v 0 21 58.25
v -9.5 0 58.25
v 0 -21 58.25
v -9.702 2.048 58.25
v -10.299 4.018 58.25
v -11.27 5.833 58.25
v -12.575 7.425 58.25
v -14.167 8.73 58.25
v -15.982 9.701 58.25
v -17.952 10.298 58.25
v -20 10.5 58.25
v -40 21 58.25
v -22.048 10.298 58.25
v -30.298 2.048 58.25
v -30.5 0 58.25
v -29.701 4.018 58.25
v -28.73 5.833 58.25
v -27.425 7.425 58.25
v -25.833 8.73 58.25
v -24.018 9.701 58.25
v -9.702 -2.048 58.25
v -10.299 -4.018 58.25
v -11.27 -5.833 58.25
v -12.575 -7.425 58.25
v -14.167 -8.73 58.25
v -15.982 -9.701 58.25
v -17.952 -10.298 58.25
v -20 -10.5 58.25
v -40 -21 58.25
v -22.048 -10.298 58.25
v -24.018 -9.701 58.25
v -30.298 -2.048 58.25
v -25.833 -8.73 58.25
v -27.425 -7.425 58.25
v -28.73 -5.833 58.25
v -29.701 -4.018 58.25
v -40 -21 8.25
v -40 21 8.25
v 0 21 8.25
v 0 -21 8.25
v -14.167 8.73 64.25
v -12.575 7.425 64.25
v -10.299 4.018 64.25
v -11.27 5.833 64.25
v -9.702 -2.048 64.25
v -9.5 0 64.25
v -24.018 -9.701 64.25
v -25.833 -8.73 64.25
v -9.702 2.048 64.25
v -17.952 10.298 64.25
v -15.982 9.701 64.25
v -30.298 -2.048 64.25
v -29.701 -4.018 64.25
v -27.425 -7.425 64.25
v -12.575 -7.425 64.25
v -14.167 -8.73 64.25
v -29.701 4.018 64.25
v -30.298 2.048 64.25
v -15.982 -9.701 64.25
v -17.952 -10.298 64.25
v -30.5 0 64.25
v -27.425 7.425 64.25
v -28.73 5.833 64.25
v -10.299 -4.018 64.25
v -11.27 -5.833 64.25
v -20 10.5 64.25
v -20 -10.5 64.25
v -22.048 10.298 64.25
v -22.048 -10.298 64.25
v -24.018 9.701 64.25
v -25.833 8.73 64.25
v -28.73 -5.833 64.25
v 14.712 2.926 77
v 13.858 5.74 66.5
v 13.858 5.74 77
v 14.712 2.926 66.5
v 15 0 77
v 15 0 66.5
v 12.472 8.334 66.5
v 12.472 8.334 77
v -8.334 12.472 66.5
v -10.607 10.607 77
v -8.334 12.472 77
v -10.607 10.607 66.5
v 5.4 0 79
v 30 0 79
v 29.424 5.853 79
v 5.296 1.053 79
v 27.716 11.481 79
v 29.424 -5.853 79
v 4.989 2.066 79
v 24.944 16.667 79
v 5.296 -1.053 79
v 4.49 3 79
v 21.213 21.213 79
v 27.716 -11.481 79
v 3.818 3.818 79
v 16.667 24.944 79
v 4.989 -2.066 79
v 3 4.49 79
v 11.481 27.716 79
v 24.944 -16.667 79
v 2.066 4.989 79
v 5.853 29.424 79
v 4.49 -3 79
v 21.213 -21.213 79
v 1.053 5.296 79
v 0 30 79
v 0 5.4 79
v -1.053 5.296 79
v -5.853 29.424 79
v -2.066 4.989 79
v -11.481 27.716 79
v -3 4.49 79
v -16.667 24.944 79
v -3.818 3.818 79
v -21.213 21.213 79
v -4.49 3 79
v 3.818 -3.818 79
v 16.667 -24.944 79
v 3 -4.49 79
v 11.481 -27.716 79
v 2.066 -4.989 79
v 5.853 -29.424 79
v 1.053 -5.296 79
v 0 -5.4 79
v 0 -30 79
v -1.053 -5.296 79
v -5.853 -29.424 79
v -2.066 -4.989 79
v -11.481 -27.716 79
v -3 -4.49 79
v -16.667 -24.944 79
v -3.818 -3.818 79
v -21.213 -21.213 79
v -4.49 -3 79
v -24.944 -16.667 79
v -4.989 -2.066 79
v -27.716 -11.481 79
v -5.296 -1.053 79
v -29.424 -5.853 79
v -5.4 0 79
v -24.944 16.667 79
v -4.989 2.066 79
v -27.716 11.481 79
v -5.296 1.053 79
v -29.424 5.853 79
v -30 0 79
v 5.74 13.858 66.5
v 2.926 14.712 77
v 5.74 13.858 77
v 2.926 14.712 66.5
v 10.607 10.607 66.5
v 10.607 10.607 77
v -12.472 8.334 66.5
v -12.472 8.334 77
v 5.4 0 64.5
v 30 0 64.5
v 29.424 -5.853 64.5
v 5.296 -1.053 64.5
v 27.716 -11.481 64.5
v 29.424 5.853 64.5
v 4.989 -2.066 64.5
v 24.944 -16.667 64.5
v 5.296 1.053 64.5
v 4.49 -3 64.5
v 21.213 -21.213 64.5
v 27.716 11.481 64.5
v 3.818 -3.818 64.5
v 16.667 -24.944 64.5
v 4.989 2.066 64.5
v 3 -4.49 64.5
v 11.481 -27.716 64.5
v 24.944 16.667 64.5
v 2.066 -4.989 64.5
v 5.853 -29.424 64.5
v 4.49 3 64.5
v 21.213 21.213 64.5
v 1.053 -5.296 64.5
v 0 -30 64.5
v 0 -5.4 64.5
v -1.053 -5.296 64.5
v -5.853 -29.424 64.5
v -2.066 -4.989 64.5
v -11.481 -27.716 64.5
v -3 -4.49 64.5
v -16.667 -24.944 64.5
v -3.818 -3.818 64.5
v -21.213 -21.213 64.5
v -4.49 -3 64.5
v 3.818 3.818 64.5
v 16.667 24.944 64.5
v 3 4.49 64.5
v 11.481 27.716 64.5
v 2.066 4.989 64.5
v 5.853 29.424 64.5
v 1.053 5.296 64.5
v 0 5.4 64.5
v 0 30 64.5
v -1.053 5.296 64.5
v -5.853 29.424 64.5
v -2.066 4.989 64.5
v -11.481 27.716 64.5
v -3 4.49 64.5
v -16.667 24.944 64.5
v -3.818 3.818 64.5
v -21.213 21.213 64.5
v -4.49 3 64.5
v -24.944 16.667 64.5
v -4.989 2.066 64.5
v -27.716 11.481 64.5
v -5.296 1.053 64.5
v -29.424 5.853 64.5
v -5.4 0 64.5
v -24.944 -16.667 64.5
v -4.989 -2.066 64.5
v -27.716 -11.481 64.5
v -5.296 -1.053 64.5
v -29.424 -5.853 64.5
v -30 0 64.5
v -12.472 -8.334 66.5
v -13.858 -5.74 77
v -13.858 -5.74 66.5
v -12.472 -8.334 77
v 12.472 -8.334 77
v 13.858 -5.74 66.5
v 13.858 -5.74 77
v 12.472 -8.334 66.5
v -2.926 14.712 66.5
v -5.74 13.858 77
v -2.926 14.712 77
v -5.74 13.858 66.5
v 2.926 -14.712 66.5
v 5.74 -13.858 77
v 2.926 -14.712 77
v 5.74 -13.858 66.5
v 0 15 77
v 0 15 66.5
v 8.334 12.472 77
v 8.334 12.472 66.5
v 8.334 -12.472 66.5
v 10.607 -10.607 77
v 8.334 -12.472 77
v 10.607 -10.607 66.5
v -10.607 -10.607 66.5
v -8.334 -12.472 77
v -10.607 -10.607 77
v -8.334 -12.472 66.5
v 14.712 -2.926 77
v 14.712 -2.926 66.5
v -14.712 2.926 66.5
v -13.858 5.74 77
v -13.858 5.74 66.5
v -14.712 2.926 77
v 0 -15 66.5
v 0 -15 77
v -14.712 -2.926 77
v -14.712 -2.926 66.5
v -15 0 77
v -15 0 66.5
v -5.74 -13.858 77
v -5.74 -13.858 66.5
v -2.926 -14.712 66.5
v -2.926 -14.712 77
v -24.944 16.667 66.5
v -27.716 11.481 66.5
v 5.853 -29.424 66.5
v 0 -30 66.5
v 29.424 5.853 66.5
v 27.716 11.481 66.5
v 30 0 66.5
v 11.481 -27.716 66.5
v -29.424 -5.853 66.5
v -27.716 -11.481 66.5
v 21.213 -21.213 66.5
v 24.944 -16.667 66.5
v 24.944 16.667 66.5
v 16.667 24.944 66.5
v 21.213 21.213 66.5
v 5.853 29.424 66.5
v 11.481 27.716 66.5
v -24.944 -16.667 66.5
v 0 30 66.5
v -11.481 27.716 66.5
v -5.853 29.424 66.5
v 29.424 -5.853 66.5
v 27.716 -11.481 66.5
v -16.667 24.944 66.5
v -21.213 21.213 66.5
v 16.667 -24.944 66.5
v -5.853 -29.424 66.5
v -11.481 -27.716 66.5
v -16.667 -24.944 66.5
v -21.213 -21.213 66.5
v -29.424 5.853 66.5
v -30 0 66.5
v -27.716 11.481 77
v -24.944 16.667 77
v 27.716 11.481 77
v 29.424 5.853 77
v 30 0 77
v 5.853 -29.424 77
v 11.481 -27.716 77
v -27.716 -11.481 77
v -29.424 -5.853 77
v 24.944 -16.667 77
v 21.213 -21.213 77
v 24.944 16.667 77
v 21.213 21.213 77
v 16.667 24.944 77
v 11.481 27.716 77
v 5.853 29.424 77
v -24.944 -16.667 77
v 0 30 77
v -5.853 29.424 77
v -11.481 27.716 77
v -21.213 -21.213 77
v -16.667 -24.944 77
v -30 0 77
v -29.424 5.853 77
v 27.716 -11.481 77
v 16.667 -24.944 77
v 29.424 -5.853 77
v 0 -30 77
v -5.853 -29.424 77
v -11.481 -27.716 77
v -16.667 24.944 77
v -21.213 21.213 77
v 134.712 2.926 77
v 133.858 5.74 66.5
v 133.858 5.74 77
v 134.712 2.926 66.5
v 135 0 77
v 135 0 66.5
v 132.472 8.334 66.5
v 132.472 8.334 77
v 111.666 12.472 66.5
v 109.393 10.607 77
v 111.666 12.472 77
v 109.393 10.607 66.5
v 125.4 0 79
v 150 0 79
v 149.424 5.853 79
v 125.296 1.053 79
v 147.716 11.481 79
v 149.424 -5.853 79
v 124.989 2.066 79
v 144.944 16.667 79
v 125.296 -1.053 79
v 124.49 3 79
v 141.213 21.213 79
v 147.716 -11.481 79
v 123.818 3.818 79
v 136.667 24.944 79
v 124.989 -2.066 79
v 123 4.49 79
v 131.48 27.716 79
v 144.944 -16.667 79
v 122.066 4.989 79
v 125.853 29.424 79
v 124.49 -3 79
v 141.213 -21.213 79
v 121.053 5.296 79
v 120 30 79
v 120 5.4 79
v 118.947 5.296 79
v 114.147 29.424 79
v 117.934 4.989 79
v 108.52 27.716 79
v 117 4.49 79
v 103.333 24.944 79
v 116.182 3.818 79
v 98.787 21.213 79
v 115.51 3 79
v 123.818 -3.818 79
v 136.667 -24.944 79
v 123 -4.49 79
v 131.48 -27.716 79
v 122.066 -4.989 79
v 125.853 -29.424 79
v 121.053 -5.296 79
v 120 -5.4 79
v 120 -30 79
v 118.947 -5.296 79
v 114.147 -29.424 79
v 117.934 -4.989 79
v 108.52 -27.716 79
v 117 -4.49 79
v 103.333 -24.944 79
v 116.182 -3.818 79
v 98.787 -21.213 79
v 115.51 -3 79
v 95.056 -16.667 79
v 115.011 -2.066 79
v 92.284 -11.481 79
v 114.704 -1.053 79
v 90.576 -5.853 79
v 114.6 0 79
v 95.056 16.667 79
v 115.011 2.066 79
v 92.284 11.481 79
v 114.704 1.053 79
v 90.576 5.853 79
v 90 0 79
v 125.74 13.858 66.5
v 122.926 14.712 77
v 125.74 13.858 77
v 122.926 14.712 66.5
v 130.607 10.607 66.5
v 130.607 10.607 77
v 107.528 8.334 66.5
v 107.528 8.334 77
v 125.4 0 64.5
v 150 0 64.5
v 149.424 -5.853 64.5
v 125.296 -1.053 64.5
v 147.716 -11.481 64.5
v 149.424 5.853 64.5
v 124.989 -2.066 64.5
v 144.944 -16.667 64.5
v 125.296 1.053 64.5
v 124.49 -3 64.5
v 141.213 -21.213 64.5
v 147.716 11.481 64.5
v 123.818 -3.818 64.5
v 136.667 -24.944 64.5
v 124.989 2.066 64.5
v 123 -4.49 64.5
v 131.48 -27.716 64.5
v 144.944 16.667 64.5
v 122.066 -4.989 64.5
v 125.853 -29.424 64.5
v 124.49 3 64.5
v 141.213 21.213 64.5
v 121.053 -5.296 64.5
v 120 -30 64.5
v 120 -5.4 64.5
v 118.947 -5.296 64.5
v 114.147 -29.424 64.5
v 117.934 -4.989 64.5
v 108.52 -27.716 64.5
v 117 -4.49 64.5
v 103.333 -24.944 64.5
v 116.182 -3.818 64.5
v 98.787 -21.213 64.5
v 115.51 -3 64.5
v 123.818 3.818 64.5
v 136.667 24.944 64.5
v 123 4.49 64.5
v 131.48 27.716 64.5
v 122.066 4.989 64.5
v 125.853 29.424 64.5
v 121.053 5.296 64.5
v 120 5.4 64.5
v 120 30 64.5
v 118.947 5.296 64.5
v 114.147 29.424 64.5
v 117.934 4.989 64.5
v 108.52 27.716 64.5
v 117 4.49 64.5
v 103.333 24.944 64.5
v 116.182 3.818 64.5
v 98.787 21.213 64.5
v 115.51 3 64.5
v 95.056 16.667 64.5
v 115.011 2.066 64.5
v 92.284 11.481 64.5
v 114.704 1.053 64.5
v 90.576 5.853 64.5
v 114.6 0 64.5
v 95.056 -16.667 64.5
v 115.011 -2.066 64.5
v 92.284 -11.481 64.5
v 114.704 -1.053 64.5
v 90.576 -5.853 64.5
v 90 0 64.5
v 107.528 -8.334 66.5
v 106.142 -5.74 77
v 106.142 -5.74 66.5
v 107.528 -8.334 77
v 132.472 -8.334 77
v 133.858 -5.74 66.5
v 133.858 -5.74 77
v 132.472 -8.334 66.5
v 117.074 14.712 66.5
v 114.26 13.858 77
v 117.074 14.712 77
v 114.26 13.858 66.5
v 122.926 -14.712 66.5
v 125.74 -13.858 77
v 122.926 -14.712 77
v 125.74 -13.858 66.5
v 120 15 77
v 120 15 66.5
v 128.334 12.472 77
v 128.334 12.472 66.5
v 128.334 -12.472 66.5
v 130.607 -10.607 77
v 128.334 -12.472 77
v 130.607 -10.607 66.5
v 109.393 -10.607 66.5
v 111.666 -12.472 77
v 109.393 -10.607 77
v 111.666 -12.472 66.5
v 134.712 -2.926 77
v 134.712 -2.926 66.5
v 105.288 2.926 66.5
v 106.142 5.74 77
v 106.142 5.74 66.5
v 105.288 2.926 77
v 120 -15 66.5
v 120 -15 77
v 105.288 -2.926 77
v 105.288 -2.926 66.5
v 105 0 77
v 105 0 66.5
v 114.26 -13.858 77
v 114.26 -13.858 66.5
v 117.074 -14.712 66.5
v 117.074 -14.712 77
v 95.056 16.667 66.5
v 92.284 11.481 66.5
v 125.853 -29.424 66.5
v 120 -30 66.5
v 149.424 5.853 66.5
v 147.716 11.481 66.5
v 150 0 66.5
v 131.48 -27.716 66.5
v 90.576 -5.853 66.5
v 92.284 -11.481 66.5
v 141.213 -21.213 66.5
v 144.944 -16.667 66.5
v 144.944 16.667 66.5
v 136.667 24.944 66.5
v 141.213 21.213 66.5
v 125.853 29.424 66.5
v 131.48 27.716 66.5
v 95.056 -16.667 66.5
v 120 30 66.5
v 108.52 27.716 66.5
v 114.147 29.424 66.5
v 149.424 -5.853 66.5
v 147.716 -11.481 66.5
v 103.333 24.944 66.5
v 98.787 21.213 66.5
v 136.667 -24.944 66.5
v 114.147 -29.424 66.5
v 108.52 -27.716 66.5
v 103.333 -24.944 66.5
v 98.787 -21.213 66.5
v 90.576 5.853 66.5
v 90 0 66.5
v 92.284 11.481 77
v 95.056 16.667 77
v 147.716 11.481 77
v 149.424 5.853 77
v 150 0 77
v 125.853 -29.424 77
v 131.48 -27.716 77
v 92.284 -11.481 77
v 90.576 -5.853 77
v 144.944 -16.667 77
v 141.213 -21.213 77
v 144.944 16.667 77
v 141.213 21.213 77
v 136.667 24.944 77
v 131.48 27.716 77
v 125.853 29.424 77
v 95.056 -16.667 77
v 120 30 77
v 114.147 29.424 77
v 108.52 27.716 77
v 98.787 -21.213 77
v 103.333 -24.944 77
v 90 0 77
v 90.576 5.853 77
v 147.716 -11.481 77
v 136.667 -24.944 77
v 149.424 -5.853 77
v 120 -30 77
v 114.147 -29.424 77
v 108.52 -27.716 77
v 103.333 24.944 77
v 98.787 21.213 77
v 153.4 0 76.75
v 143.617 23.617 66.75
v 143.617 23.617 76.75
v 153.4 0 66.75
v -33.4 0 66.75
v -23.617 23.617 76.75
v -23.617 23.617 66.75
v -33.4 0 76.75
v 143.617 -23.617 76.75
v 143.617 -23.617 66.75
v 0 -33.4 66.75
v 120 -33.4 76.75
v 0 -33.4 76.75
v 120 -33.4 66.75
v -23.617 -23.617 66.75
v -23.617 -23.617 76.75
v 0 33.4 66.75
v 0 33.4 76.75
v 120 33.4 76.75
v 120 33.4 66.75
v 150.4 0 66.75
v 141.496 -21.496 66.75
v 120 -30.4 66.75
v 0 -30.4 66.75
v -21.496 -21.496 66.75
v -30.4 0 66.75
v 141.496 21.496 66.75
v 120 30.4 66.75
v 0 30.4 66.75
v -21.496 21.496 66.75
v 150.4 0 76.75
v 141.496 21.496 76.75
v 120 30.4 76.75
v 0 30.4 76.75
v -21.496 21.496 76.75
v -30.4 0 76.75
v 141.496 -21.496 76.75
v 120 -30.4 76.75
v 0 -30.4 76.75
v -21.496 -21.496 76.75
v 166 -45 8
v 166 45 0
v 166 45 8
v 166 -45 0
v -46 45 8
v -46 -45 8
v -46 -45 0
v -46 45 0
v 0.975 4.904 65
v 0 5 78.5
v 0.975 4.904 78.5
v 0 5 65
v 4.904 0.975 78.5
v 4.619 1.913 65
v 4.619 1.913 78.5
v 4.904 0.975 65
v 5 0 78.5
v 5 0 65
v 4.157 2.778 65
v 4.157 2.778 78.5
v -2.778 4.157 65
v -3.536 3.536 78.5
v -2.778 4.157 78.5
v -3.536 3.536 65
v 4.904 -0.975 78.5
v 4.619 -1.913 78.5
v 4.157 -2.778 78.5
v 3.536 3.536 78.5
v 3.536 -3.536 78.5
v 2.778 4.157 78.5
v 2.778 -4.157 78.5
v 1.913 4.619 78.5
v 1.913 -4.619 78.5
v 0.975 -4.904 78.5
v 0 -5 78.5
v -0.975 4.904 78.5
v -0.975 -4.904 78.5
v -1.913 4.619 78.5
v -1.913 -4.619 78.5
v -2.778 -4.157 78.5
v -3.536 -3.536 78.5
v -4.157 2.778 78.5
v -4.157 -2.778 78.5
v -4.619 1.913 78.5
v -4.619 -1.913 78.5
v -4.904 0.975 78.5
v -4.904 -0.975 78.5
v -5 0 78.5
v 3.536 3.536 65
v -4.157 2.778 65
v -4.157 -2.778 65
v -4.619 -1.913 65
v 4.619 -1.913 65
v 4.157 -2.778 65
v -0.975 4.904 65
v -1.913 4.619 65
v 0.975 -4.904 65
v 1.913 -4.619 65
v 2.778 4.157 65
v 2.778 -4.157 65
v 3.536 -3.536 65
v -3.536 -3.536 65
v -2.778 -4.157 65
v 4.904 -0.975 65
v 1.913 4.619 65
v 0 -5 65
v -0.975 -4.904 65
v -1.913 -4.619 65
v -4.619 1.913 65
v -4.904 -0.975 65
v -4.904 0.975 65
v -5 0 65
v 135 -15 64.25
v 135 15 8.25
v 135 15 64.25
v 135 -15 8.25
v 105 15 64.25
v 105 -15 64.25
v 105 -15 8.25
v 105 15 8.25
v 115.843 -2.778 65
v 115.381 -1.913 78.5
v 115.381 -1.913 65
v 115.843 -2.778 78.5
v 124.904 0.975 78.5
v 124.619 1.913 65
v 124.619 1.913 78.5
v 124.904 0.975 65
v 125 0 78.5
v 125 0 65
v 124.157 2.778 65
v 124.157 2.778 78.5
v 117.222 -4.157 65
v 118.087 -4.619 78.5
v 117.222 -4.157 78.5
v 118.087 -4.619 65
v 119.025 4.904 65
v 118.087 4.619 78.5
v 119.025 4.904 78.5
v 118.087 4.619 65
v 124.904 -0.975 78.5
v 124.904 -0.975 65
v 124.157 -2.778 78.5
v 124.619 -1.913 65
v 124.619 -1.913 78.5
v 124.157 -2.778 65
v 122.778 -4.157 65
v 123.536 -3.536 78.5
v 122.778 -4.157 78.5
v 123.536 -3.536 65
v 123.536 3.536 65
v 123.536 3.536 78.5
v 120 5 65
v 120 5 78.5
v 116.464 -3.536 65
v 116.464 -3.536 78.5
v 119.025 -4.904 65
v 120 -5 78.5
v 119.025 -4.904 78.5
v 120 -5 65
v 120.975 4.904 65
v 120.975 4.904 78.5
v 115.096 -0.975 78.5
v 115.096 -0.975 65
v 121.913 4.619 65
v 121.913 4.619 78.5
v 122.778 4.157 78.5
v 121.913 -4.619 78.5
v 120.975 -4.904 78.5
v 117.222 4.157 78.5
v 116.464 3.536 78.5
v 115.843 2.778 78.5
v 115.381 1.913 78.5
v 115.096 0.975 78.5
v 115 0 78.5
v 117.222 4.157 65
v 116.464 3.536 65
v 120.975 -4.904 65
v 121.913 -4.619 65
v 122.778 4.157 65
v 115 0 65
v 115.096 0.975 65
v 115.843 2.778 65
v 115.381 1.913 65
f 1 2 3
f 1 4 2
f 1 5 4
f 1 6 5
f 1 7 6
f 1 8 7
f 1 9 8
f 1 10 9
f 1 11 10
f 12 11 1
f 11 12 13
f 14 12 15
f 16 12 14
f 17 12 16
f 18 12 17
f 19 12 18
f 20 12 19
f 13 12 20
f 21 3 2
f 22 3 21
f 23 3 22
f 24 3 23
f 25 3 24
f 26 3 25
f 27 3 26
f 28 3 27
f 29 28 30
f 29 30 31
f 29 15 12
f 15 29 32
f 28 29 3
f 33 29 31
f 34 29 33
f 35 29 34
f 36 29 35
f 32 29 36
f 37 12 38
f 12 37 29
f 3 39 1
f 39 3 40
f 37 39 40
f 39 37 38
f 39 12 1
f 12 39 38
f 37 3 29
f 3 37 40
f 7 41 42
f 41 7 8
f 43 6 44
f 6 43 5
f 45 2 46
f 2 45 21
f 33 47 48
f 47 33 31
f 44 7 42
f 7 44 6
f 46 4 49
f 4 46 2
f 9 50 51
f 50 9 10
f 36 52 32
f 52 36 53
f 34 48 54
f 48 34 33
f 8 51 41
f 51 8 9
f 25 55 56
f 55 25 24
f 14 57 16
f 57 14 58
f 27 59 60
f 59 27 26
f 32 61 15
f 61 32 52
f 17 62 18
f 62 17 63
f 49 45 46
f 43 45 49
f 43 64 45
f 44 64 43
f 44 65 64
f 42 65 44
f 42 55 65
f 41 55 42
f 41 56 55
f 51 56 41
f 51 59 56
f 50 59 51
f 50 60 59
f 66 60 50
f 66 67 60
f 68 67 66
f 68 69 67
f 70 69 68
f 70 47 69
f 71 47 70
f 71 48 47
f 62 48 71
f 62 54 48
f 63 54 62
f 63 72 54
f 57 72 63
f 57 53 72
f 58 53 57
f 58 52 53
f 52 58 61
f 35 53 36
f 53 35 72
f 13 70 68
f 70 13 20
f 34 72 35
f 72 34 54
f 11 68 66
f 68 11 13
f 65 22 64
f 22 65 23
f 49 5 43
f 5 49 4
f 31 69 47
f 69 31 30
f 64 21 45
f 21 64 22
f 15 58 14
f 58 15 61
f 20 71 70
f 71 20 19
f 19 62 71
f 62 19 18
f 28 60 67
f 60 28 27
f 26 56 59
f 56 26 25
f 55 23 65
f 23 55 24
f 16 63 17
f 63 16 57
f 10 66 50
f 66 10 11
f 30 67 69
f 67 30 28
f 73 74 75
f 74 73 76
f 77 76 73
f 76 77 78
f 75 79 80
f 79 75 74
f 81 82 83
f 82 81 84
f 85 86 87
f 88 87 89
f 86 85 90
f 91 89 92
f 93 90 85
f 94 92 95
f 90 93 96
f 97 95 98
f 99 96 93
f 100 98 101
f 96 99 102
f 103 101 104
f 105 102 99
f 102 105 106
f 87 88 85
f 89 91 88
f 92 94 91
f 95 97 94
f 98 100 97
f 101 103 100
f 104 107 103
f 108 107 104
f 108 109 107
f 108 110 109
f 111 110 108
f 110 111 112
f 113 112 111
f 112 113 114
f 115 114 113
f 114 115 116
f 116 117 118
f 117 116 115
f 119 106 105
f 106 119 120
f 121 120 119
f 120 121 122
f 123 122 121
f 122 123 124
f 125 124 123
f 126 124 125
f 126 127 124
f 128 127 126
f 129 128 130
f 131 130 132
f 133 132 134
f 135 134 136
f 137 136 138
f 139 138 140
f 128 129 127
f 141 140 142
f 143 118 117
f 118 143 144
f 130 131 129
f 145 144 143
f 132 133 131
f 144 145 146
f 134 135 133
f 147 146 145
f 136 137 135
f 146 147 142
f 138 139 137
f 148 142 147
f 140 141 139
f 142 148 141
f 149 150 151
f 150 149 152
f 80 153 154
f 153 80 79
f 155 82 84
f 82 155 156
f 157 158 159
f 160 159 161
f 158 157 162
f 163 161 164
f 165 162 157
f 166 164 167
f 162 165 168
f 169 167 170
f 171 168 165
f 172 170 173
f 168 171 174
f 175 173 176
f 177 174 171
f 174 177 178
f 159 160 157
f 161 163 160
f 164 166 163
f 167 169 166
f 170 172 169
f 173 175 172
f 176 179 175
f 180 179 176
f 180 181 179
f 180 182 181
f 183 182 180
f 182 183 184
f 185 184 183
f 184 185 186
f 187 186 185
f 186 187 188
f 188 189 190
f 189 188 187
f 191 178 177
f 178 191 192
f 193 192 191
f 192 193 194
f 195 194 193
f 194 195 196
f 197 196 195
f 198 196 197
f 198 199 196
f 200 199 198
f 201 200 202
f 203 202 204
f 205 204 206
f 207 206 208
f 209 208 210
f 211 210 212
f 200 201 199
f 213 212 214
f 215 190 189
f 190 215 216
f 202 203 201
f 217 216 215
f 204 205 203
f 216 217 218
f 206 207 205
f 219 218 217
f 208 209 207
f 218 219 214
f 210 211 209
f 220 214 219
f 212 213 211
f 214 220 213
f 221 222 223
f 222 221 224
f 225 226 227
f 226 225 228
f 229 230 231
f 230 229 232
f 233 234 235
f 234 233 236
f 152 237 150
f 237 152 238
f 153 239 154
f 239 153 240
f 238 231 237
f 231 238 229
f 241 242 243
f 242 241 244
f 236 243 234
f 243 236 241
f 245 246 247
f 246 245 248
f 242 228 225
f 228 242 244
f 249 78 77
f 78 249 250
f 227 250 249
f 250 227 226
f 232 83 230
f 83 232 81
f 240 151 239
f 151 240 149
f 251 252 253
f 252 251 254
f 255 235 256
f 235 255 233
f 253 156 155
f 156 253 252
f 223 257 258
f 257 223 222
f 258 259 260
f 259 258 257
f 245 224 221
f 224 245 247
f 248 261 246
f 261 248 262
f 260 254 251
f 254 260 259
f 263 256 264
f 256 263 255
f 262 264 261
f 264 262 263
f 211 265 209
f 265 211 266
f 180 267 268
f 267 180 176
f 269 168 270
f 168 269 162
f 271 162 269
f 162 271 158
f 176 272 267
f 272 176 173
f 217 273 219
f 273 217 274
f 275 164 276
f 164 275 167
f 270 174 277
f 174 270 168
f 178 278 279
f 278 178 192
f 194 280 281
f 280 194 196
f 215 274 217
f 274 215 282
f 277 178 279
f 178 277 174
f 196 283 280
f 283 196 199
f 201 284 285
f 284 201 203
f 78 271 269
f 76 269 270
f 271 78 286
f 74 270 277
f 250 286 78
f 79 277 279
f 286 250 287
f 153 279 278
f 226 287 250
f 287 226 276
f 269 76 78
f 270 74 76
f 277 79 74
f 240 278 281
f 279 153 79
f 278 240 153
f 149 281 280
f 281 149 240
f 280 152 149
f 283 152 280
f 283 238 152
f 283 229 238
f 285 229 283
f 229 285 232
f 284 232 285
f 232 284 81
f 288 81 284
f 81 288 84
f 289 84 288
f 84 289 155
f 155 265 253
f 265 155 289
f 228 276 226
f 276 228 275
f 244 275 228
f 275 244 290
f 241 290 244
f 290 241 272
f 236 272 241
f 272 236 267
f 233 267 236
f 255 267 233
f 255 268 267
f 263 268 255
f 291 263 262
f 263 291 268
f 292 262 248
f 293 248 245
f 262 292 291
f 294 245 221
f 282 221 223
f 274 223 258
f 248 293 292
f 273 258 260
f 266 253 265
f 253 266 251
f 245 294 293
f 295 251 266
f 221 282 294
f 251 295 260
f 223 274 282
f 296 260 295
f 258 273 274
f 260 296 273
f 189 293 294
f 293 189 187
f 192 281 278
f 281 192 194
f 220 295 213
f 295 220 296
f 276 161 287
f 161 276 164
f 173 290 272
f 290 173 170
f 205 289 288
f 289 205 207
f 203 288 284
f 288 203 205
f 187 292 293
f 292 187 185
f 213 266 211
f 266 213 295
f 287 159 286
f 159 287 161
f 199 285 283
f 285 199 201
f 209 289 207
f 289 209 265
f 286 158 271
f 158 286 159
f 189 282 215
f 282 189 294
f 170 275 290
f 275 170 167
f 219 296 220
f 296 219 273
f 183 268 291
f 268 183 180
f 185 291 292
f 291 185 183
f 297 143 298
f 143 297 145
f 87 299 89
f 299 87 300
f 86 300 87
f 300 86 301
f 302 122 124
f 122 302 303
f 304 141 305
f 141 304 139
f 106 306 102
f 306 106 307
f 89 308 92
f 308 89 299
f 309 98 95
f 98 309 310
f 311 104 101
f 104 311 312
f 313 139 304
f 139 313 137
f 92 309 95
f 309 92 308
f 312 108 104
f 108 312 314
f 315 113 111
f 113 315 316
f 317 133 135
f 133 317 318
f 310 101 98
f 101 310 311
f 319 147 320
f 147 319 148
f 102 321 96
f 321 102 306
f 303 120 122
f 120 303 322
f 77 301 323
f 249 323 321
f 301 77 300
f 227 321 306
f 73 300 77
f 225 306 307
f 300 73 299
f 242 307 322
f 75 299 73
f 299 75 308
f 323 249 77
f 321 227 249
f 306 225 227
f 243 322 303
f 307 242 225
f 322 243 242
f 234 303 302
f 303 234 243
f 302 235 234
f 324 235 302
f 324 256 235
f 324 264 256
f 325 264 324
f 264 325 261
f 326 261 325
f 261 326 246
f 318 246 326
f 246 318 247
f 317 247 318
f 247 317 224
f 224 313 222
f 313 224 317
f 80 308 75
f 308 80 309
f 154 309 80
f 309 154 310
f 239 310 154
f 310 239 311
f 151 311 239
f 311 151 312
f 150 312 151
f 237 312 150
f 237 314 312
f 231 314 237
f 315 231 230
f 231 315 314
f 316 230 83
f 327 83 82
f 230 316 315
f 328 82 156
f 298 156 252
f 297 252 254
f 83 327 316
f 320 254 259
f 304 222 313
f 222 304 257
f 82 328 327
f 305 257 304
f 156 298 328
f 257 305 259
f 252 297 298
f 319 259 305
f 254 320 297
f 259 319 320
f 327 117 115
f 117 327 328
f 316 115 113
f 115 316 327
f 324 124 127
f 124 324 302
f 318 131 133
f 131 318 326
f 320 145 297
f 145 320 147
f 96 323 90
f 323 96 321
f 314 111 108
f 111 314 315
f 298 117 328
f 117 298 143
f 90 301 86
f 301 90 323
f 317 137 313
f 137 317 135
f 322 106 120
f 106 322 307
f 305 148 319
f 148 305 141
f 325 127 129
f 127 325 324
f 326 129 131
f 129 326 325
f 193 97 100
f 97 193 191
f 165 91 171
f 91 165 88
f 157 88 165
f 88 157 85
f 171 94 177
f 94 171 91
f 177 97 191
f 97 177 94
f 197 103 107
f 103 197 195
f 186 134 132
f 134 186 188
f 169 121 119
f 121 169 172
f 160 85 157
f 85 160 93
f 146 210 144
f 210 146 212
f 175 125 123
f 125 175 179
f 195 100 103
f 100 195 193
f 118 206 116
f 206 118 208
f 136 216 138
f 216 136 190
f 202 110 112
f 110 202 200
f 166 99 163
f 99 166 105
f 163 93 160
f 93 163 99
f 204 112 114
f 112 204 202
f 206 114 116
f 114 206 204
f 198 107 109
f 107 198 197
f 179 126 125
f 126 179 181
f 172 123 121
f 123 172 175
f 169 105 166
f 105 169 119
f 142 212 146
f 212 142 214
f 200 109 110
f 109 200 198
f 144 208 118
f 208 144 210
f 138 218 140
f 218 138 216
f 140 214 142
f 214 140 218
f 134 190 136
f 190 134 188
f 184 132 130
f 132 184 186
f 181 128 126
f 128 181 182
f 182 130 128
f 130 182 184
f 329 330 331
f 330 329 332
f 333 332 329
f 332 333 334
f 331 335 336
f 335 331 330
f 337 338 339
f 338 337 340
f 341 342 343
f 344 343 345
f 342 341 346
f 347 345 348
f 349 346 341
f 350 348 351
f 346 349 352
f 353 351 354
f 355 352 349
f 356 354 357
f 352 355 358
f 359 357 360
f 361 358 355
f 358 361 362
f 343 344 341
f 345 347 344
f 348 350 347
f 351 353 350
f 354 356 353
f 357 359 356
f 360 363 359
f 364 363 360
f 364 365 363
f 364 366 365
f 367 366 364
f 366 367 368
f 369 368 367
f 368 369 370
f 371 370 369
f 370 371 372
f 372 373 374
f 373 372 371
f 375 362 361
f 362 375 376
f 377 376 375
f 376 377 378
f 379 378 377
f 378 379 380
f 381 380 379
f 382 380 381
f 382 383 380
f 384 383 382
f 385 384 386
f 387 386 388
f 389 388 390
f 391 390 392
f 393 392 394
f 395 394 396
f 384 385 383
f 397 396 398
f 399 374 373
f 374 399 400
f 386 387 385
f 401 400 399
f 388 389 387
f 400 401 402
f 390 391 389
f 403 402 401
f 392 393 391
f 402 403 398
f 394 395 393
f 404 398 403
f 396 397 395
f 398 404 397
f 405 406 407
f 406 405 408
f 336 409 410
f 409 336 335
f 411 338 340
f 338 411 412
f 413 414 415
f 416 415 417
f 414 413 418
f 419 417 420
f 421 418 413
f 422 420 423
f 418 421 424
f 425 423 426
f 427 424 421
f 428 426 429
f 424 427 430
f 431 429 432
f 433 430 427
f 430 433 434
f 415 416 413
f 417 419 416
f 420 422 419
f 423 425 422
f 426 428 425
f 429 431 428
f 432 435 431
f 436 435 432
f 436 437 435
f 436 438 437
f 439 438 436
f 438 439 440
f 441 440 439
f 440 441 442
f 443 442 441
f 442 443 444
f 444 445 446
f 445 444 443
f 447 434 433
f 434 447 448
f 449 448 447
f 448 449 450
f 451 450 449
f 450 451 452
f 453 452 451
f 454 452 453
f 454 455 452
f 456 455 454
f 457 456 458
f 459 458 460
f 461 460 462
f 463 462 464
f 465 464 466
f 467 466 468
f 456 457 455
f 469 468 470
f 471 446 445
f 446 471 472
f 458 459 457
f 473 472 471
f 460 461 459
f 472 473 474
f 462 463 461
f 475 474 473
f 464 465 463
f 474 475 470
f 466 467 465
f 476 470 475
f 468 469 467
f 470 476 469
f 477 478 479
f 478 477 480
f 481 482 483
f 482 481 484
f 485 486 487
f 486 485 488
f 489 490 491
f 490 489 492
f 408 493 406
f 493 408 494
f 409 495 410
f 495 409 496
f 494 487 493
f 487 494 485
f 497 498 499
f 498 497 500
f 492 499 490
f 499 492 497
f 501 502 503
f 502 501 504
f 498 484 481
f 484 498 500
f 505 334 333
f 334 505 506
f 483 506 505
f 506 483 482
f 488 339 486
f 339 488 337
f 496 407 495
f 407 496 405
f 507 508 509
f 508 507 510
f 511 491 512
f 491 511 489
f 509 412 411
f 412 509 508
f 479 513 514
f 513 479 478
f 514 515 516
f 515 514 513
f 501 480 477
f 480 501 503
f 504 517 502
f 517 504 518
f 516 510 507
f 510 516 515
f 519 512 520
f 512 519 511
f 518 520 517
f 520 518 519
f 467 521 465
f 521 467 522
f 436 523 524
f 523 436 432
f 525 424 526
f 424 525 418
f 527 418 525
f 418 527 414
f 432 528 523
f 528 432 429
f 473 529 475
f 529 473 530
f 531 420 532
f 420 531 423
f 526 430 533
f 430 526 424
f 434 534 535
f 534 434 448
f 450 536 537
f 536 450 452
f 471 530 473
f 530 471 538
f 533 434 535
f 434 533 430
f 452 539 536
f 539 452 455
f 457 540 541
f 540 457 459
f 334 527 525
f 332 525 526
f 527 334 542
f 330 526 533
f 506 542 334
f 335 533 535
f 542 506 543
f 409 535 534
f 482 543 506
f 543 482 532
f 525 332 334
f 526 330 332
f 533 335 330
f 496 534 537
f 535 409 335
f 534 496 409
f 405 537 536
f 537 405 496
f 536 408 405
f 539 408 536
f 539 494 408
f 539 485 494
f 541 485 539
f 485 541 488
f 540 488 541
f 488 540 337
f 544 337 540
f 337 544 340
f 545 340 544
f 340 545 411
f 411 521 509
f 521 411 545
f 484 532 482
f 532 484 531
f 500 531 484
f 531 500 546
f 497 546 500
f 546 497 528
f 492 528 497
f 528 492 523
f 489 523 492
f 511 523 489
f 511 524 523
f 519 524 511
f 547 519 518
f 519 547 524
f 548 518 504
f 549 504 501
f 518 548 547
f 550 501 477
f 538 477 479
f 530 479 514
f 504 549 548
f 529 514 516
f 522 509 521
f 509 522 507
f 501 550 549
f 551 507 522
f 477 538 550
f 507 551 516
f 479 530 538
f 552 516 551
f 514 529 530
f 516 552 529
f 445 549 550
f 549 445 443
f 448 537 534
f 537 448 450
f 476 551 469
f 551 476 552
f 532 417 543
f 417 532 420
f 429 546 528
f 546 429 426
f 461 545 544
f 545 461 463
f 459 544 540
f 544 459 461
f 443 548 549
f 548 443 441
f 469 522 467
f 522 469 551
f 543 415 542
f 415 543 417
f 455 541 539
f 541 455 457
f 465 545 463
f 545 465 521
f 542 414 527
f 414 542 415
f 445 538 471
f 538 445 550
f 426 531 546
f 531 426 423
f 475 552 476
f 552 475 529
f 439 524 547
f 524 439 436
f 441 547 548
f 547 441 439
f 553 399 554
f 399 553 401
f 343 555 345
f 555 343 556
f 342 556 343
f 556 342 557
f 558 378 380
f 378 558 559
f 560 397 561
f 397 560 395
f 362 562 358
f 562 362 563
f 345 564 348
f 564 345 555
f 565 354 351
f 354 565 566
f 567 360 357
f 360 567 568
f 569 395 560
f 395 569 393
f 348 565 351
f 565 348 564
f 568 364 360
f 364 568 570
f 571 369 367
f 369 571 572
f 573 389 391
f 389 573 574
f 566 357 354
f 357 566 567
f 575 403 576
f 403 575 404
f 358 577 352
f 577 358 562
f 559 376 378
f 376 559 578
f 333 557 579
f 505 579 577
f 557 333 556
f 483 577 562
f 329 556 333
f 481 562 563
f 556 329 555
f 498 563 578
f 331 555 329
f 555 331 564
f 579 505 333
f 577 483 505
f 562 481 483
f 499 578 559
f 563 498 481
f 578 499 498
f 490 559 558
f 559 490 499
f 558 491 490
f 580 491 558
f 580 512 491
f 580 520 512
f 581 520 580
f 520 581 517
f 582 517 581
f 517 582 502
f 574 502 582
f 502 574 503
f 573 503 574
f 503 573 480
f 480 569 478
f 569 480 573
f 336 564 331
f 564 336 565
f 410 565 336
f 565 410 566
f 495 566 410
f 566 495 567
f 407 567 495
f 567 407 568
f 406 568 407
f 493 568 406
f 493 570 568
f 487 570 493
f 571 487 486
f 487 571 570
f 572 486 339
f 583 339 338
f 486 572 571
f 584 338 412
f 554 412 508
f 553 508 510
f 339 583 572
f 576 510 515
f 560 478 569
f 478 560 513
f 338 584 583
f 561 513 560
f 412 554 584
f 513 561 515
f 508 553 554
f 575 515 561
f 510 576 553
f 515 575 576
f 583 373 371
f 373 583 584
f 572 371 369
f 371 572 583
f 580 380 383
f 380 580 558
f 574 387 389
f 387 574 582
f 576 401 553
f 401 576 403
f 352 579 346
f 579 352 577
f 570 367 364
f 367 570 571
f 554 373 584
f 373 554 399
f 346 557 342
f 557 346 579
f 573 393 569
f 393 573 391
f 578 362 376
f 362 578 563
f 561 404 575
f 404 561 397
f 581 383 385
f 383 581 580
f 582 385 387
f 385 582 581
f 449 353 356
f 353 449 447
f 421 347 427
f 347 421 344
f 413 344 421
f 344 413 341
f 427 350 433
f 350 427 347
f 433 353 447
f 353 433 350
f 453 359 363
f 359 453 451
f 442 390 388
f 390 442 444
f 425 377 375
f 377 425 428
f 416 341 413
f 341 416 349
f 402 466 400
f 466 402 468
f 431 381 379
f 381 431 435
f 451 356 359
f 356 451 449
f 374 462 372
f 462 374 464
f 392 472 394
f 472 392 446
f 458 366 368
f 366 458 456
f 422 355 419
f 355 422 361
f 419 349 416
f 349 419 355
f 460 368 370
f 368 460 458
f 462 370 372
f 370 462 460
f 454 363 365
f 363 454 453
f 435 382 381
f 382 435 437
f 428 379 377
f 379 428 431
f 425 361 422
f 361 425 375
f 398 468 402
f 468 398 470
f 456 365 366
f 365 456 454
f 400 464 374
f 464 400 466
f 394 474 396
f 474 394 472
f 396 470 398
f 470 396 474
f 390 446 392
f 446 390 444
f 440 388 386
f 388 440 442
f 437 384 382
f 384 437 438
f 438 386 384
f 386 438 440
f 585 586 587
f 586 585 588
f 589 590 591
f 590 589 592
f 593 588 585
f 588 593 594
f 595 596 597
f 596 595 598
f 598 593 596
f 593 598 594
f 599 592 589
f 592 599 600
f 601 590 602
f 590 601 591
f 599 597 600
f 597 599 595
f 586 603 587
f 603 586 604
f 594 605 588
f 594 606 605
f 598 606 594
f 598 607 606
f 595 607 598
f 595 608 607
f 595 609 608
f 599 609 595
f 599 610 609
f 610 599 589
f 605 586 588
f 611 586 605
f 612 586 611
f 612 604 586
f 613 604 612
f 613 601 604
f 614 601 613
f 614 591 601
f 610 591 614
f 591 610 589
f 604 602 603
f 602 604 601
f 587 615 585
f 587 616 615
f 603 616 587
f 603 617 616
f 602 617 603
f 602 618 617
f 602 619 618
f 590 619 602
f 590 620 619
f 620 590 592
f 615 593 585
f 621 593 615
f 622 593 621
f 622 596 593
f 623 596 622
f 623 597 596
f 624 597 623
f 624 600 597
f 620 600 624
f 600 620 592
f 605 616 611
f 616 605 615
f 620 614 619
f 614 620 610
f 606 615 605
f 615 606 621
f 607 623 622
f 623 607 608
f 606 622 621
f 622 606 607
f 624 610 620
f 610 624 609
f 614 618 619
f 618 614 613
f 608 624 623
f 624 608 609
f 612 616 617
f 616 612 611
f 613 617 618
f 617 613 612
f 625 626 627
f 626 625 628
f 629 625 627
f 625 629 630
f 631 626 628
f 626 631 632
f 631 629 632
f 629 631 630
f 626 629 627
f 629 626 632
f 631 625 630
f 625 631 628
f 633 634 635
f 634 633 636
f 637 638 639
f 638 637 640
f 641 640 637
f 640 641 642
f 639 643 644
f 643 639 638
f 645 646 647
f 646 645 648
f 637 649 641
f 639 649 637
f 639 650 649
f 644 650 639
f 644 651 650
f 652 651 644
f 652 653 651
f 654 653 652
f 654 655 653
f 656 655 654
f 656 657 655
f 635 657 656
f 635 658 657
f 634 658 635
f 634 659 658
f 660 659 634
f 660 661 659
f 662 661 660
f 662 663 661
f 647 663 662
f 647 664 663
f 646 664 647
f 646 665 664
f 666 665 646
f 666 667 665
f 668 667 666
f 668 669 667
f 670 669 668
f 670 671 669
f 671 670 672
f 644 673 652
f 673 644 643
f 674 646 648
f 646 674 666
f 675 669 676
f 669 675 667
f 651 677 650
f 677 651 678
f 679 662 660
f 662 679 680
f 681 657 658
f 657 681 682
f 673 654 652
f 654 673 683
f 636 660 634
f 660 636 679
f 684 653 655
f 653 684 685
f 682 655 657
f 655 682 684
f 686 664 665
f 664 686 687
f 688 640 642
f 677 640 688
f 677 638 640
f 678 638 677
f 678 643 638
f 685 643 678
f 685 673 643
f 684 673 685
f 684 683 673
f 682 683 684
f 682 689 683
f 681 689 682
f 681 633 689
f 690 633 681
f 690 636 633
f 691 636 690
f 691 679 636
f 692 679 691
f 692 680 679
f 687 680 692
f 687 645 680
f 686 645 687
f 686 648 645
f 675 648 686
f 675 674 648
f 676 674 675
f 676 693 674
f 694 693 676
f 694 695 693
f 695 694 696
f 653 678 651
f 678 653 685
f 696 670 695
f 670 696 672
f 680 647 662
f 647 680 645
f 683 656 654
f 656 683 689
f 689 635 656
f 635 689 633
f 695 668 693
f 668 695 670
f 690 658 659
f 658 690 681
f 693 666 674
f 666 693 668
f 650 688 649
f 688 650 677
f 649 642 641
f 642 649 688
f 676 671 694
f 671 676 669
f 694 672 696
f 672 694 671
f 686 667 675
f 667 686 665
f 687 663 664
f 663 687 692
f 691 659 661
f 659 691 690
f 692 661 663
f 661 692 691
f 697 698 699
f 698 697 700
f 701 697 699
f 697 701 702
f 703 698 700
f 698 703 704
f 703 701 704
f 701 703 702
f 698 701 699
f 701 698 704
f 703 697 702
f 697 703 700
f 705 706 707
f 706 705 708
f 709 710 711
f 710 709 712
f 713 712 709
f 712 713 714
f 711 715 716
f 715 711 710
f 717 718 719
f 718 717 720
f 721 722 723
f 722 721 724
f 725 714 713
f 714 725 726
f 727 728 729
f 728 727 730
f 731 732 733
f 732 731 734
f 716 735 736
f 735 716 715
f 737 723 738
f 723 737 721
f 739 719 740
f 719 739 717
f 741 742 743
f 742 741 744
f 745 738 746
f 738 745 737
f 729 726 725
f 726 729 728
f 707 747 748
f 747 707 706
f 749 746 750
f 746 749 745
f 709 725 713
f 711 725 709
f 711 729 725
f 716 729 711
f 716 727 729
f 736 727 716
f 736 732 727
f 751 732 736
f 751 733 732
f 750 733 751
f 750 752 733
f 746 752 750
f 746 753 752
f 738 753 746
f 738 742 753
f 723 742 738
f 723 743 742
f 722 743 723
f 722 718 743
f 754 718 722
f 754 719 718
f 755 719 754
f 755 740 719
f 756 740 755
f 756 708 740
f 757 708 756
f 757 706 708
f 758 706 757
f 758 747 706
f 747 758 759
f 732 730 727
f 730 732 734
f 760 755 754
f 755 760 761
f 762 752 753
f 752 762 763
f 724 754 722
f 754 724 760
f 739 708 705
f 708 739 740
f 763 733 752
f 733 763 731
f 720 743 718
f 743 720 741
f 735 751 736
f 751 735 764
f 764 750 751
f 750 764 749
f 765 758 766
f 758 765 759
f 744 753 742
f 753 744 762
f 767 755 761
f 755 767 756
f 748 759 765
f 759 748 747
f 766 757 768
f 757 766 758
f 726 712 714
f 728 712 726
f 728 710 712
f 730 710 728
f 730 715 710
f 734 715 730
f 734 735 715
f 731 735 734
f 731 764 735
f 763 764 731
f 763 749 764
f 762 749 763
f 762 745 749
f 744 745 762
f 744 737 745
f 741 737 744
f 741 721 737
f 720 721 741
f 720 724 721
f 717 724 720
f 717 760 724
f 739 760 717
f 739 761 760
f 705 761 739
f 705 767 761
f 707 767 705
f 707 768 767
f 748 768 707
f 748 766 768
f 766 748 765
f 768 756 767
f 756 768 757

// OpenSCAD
$fn = 32;

// ------------------------------------------------------------------------
// Motor belt drive: span 120 mm, pulleys d60, belt 10 mm wide
// Every part is its own module, assembly() places every instance.
// ------------------------------------------------------------------------

// --- part 1 ---
module base_plate() {
  difference() {
    translate([-106, -45, 0]) cube([212, 90, 8]);
  }
}

// --- part 2 ---
module motor() {
  union() {
    translate([-25, -21, 0]) cube([50, 42, 40]);
    translate([28, 0, 20]) rotate([0, 90, 0]) cylinder(h = 6, d = 21, center = true);
  }
}

// --- part 3 ---
module drive_shaft() {
  translate([0, 0, -6.75]) cylinder(h = 13.5, d = 10);
}

// --- part 4 ---
module pulley_drive() {
  difference() {
    union() {
      cylinder(h = 14.5, d = 30);
      cylinder(h = 2, d = 60);
      translate([0, 0, 12.5]) cylinder(h = 2, d = 60);
    }
    translate([0, 0, -1]) cylinder(h = 16.5, d = 10.8);
  }
}

// --- part 5 ---
module idler_post() {
  translate([-15, -15, 0]) cube([30, 30, 56]);
}

// --- part 6 ---
module driven_shaft() {
  translate([0, 0, -6.75]) cylinder(h = 13.5, d = 10);
}

// --- part 7 ---
module pulley_driven() {
  difference() {
    union() {
      cylinder(h = 14.5, d = 30);
      cylinder(h = 2, d = 60);
      translate([0, 0, 12.5]) cylinder(h = 2, d = 60);
    }
    translate([0, 0, -1]) cylinder(h = 16.5, d = 10.8);
  }
}

// --- part 8 ---
module drive_belt() {
  difference() {
    linear_extrude(height = 10) polygon(points = concat([for (a = [90 : 45 : 270]) [33.4 * cos(a), 33.4 * sin(a)]], [for (a = [270 : 45 : 450]) [120 + 33.4 * cos(a), 33.4 * sin(a)]]));
    translate([0, 0, -1]) linear_extrude(height = 12) polygon(points = concat([for (a = [90 : 45 : 270]) [30.4 * cos(a), 30.4 * sin(a)]], [for (a = [270 : 45 : 450]) [120 + 30.4 * cos(a), 30.4 * sin(a)]]));
  }
}

// --- assembly ---
module assembly() {
  color([0.80, 0.24, 0.20]) translate([60, 0, 0]) rotate([0, 0, 0]) base_plate();
  color([0.20, 0.45, 0.75]) translate([0, 0, 33.25]) rotate([0, 270, 0]) motor();
  color([0.25, 0.62, 0.32]) translate([0, 0, 71.75]) rotate([0, 0, 0]) drive_shaft();
  color([0.92, 0.70, 0.18]) translate([0, 0, 64.5]) rotate([0, 0, 0]) pulley_drive();
  color([0.58, 0.35, 0.70]) translate([120, 0, 8.25]) rotate([0, 0, 0]) idler_post();
  color([0.16, 0.66, 0.66]) translate([120, 0, 71.75]) rotate([0, 0, 0]) driven_shaft();
  color([0.85, 0.48, 0.18]) translate([120, 0, 64.5]) rotate([0, 0, 0]) pulley_driven();
  color([0.55, 0.60, 0.65]) translate([0, 0, 66.75]) rotate([0, 0, 0]) drive_belt();
}

assembly();
